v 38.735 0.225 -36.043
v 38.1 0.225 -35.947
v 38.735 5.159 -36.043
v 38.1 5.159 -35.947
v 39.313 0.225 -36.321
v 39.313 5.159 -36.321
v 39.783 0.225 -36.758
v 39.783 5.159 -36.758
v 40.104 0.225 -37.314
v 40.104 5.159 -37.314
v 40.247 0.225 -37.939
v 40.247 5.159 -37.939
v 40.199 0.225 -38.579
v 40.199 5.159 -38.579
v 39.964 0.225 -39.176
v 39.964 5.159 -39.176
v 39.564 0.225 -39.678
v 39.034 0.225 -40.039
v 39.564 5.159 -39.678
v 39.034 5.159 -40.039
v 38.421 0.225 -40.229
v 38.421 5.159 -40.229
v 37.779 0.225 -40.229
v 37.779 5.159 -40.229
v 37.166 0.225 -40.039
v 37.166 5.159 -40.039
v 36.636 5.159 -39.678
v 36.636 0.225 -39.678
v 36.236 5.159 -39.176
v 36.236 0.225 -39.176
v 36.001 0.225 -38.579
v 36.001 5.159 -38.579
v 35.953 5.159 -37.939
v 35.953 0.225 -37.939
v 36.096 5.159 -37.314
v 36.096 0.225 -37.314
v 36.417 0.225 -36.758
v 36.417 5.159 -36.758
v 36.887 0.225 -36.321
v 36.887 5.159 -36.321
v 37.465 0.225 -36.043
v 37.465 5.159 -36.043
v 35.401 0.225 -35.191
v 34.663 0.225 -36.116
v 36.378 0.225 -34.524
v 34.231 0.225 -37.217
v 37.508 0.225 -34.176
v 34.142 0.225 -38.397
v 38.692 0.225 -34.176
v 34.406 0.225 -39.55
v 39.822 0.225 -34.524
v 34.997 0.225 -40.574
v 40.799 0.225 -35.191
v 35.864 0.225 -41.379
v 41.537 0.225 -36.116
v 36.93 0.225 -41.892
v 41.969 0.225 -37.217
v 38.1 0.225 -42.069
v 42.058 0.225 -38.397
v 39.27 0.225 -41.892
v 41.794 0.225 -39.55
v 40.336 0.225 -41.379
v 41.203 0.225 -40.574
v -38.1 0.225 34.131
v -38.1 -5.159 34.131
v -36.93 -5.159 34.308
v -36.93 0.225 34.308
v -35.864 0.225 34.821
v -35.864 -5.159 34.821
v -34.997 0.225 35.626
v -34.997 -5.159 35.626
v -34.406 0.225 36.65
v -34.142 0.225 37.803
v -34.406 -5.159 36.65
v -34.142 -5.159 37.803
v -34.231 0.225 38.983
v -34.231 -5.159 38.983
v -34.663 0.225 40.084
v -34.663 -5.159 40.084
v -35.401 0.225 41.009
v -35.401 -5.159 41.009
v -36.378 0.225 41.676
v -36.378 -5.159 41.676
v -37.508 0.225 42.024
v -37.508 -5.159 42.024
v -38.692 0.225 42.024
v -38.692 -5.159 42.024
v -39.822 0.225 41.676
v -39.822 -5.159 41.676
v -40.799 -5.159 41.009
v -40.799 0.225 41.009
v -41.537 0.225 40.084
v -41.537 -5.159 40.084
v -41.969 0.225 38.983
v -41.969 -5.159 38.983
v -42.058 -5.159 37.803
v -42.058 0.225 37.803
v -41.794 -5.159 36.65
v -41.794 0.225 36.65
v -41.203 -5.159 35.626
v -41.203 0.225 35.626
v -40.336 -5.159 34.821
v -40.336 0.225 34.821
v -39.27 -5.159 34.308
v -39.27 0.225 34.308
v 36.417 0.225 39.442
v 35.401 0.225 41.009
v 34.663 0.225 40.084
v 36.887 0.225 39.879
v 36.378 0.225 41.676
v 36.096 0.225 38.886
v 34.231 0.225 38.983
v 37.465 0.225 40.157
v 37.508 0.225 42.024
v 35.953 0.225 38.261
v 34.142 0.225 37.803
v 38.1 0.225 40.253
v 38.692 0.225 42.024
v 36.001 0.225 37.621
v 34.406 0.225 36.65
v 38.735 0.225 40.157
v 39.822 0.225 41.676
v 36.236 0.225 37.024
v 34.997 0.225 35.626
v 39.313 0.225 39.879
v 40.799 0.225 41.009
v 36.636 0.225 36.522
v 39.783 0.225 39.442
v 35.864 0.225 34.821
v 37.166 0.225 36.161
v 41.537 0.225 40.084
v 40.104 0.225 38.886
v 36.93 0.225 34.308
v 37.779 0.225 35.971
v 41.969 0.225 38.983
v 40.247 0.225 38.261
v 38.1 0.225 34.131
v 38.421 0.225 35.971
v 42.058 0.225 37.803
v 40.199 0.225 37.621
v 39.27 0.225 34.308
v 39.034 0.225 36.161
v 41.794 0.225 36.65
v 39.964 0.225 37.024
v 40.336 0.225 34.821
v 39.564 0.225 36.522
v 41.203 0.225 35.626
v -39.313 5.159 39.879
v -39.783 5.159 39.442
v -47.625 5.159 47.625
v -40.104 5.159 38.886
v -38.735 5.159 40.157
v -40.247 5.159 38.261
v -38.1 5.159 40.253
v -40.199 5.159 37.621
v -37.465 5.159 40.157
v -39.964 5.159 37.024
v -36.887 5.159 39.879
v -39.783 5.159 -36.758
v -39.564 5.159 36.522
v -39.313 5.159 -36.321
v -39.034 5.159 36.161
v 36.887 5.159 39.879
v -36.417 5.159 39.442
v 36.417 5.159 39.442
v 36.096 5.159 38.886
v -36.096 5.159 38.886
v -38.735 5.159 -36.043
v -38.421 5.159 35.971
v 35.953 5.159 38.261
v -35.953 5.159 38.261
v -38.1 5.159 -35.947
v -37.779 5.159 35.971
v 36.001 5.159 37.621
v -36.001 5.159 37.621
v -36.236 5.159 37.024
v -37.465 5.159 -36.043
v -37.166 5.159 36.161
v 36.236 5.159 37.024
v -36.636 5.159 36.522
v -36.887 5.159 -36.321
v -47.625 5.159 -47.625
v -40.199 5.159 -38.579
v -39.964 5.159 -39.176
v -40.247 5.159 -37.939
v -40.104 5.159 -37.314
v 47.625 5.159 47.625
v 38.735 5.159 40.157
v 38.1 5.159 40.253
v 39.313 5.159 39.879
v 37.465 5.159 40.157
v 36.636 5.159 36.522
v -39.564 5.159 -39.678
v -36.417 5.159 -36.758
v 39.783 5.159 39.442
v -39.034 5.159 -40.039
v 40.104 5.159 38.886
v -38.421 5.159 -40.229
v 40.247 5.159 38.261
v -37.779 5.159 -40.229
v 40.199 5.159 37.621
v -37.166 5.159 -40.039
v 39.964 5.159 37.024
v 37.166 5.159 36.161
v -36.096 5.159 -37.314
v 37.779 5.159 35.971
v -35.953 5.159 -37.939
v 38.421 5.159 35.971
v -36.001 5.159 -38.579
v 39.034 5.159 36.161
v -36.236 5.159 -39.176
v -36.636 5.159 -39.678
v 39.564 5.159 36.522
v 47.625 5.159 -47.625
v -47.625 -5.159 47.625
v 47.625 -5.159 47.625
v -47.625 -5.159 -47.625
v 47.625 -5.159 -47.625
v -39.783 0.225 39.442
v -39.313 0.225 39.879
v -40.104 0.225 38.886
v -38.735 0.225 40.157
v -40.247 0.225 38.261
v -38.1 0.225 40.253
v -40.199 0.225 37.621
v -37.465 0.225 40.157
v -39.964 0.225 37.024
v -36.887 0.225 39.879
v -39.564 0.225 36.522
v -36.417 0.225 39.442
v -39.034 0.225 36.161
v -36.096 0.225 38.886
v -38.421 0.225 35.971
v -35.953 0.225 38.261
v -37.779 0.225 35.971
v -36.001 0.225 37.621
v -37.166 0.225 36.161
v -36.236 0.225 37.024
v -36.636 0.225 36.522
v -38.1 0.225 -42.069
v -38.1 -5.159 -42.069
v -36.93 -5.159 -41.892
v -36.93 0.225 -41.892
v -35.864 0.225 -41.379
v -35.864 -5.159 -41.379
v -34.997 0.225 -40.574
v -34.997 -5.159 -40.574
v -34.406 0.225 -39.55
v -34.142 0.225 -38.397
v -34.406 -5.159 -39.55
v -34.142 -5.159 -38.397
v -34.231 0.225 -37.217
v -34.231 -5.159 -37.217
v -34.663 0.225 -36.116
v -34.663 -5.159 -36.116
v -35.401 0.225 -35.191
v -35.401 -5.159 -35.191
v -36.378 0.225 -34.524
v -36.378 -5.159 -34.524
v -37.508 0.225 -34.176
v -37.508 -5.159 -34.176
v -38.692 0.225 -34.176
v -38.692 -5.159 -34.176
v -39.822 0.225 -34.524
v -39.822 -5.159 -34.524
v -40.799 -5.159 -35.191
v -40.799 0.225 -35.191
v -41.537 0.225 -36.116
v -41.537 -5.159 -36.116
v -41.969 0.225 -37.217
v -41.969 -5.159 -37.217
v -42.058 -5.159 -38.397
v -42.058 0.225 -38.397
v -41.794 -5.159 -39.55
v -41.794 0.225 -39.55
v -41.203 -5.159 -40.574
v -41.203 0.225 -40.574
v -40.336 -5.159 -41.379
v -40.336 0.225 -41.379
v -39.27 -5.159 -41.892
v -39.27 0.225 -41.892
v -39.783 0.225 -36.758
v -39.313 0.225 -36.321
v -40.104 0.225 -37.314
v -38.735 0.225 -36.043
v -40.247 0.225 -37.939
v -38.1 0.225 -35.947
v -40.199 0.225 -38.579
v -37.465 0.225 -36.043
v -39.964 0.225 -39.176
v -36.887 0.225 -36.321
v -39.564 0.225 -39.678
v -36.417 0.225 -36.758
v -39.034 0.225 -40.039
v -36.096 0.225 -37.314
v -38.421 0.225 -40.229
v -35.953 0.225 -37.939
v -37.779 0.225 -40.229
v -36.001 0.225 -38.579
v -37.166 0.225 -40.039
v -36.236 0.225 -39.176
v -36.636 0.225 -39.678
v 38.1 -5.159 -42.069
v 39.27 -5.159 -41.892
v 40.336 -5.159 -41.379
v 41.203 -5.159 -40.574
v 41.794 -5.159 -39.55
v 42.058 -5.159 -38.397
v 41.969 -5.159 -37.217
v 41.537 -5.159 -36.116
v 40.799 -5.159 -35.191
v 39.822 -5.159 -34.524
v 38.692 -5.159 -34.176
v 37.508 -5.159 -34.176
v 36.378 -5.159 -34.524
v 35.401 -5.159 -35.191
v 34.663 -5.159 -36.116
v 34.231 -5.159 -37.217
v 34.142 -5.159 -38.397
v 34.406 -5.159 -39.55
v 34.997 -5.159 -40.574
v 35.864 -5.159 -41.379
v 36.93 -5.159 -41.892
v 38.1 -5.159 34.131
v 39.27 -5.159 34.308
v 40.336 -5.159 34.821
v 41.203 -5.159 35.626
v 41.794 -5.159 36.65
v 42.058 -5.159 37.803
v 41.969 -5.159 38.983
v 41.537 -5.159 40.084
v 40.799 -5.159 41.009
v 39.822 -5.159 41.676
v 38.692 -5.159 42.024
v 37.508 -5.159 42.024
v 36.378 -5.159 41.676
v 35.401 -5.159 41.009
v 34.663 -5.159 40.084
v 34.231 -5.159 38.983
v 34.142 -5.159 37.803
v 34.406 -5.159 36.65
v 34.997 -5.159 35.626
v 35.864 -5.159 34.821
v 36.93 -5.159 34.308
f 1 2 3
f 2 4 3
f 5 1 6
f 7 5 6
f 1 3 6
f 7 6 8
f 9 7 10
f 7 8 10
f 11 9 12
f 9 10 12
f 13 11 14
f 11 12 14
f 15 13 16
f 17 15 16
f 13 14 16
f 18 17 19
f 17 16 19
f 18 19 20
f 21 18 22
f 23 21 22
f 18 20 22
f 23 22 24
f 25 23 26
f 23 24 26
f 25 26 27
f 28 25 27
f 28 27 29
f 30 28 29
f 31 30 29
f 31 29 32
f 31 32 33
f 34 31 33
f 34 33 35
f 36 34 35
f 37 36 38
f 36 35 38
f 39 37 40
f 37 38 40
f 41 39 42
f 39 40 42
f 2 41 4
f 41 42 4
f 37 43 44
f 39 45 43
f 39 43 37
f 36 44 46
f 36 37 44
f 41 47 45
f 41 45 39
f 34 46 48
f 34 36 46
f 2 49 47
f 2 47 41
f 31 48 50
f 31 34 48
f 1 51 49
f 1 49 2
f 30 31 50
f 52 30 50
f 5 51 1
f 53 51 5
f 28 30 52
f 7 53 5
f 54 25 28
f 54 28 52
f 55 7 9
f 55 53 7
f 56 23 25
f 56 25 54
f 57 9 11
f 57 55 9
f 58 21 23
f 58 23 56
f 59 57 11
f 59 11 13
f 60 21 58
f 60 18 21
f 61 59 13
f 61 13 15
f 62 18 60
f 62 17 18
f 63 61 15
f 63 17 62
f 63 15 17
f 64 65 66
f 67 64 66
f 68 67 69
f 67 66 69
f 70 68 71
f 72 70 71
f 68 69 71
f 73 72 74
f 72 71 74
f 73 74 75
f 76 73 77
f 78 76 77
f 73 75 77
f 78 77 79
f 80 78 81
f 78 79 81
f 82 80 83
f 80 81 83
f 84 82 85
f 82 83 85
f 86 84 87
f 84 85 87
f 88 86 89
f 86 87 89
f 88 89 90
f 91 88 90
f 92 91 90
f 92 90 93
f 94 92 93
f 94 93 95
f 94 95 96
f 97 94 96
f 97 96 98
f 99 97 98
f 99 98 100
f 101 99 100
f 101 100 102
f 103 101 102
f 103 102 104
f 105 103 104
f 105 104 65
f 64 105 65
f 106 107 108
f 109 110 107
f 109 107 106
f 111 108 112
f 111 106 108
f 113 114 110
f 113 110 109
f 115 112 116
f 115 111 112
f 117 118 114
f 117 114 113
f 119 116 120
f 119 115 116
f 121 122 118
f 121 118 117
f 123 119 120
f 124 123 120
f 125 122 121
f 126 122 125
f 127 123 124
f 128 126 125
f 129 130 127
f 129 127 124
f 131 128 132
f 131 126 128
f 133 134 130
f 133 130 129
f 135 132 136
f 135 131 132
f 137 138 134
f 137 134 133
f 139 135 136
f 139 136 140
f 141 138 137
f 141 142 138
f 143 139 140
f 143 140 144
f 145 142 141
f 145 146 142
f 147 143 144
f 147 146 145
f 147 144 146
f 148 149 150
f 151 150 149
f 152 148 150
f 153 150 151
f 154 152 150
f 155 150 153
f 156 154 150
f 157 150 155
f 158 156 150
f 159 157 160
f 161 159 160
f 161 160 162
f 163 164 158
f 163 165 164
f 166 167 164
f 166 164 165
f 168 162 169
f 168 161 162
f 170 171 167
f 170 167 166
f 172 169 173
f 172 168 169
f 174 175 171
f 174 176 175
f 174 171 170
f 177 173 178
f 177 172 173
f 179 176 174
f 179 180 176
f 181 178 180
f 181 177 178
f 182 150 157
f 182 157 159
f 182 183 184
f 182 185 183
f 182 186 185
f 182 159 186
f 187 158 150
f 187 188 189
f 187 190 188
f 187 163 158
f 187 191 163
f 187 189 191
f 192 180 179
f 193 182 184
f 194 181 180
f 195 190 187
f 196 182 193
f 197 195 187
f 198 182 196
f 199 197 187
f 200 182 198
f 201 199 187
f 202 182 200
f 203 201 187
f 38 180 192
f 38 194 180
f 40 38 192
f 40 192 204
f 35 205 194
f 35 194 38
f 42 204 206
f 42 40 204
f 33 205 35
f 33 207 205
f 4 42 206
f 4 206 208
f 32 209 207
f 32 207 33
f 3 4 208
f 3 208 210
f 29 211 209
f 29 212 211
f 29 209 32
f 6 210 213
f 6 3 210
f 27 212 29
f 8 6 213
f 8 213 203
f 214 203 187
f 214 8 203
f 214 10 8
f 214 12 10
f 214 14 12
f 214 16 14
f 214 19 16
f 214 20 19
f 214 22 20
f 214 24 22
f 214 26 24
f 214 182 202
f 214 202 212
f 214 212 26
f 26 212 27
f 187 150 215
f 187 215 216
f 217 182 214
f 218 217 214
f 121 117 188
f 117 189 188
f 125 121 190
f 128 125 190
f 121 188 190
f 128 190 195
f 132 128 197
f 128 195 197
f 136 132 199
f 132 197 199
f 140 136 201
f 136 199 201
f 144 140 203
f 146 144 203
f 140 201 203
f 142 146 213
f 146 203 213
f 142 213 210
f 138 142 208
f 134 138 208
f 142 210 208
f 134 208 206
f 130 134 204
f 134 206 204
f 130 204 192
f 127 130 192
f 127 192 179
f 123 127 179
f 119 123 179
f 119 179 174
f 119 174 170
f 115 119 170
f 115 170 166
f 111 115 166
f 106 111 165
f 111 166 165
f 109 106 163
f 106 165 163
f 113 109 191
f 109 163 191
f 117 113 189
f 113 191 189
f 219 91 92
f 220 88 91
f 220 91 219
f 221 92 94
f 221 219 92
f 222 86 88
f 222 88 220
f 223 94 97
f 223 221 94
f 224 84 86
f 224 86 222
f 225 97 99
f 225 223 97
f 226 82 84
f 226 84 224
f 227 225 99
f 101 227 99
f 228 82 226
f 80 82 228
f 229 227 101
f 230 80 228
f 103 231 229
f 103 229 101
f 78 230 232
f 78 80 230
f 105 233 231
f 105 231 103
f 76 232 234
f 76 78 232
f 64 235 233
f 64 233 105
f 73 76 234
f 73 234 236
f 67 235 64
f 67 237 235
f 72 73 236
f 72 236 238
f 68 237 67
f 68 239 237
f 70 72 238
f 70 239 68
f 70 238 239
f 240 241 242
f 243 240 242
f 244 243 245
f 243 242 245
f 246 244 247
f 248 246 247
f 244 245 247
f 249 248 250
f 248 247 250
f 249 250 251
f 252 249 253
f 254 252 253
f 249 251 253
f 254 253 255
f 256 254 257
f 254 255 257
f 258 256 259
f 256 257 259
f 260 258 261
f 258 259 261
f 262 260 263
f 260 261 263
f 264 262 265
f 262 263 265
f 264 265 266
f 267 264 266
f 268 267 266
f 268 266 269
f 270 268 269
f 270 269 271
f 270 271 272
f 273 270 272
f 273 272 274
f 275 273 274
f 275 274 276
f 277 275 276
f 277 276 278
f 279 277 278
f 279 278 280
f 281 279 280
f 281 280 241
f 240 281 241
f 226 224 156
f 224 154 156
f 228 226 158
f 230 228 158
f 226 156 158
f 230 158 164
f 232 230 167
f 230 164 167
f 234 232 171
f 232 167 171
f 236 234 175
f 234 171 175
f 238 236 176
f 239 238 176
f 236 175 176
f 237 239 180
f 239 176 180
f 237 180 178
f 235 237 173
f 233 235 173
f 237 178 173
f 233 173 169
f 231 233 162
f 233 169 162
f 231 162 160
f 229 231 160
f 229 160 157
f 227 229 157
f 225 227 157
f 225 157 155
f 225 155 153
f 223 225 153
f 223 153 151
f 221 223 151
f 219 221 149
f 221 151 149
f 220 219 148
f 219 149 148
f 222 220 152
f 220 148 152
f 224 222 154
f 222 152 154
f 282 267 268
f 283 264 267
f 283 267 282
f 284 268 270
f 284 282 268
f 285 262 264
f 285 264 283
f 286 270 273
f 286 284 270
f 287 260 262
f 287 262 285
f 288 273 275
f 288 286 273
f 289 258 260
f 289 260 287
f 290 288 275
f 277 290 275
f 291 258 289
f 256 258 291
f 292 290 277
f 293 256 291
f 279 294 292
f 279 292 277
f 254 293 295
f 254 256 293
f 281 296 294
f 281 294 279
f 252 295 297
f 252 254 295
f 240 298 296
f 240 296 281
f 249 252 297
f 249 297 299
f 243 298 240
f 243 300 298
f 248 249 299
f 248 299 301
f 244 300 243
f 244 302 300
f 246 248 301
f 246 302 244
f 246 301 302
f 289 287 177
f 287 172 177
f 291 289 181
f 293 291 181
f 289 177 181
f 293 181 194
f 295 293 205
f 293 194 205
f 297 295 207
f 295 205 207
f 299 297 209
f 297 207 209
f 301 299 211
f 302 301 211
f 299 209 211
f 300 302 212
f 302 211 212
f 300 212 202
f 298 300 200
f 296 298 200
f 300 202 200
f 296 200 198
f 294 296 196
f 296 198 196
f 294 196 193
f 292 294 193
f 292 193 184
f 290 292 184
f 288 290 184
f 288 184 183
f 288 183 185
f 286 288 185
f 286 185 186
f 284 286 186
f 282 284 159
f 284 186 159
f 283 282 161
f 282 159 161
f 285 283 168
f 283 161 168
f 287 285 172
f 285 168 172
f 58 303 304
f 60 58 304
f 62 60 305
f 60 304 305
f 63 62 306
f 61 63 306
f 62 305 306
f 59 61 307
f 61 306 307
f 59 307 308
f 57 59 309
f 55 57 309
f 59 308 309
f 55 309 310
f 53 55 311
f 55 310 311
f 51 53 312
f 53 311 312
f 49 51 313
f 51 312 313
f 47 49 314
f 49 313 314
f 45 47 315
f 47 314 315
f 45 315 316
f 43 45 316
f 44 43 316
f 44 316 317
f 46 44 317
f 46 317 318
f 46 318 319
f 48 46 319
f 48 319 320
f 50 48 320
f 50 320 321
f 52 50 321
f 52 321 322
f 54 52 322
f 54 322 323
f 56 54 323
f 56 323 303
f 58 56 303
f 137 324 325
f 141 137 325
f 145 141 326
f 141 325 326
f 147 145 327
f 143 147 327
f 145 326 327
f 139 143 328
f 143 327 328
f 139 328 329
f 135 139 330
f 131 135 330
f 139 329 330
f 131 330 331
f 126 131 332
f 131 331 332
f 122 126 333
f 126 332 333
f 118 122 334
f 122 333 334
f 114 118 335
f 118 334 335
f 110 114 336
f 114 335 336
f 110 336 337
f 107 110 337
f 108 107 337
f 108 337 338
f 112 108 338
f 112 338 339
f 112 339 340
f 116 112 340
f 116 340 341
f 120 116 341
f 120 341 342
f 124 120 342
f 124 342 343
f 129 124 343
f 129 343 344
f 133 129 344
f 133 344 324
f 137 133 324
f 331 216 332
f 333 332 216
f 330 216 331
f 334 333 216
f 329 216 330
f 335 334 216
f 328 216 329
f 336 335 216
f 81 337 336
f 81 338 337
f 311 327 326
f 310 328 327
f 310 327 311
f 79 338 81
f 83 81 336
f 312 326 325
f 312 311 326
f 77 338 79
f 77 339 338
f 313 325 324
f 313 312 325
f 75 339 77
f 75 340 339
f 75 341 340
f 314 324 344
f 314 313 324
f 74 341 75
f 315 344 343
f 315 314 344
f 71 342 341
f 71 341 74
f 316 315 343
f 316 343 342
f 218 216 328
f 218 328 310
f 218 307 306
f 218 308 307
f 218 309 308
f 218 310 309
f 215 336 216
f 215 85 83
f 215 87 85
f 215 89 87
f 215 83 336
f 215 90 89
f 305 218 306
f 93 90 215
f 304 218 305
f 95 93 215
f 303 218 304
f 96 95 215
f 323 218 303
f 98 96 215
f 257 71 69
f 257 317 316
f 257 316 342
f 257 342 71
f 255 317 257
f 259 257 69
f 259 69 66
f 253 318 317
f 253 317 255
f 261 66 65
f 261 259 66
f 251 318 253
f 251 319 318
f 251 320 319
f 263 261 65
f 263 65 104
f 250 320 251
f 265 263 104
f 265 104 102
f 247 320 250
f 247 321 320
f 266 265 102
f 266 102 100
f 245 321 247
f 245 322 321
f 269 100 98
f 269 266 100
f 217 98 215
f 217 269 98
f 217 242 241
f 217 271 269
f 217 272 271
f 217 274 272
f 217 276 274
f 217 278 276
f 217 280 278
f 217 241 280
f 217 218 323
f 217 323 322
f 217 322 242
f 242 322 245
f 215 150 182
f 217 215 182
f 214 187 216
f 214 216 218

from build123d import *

# Parameters (mm, degrees)
SKETCH3_W                           = 101.6
SKETCH3_H                           = 11.1125
BOSS_EXTRUDE1_DEPTH                 = 50.8
BASEBORDERRADIUSSKETCH_OUTSIDE_W    = 132.41
BASEBORDERRADIUSSKETCH_OUTSIDE_H    = 132.41
BASEBORDERRADIUSSKETCH_OUTSIDE_W_2  = 95.25
BASEBORDERRADIUSSKETCH_OUTSIDE_H_2  = 95.25
BASEBORDERRADIUSCUT_EXTRUDE_DEPTH   = 73.57931249
BUMPER_6_32_TAPPED_HOLE_D           = 4.3053
BUMPER_6_32_TAPPED_HOLE_CBORE_D     = 7.9375
BUMPER_6_32_TAPPED_HOLE_CBORE_DEPTH = 5.3848
BUMPERTHREADLPATTERN_COUNT          = 2
BUMPERTHREADLPATTERN_PITCH          = 76.2
BUMPERTHREADLPATTERN_COUNT_DIR2     = 2
BUMPERTHREADLPATTERN_PITCH_DIR2     = 76.2


with BuildPart() as part:
    # Sketch3 → Boss-Extrude1 (new, symmetric)
    with BuildSketch(Plane.XY):
        Rectangle(SKETCH3_W, SKETCH3_H)
    extrude(amount=BOSS_EXTRUDE1_DEPTH, both=True)

    # FacingTopSurfaceCut
    split(bisect_by=Plane(origin=(0, 5.159375, 0), x_dir=(1, 0, 0), z_dir=(0, 1, 0)), keep=Keep.BOTTOM)

    # FacingBottomSurfaceCut
    split(bisect_by=Plane(origin=(0, -5.159375, 0), x_dir=(-1, 0, 0), z_dir=(0, -1, 0)), keep=Keep.BOTTOM)

    # BaseBorderRadiusSketch outside → BaseBorderRadiusCut-Extrude (cut, through all)
    with BuildSketch(Plane(origin=(0, 5.159375, 0), x_dir=(1, 0, 0), z_dir=(0, 1, 0))):
        Rectangle(BASEBORDERRADIUSSKETCH_OUTSIDE_W, BASEBORDERRADIUSSKETCH_OUTSIDE_H)
        Rectangle(BASEBORDERRADIUSSKETCH_OUTSIDE_W_2, BASEBORDERRADIUSSKETCH_OUTSIDE_H_2, mode=Mode.SUBTRACT)
    extrude(amount=-BASEBORDERRADIUSCUT_EXTRUDE_DEPTH, mode=Mode.SUBTRACT)

    # Bumper#6-32 Tapped Hole (through all)
    with Locations(Plane(origin=(-38.1, -5.159375, 38.1), x_dir=(0, 0, -1), z_dir=(0, -1, 0))):
        with Locations((0, 0)):
            bumper_6_32_tapped_hole = CounterBoreHole(BUMPER_6_32_TAPPED_HOLE_D / 2, BUMPER_6_32_TAPPED_HOLE_CBORE_D / 2, BUMPER_6_32_TAPPED_HOLE_CBORE_DEPTH)

    # BumperThreadLPattern: Bumper_6-32 Tapped Hole 2 × 2
    with Locations(*[(j * BUMPERTHREADLPATTERN_PITCH_DIR2, 0, -i * BUMPERTHREADLPATTERN_PITCH) for i in range(BUMPERTHREADLPATTERN_COUNT) for j in range(BUMPERTHREADLPATTERN_COUNT_DIR2) if (i, j) != (0, 0)]):
        add(bumper_6_32_tapped_hole, mode=Mode.SUBTRACT)


solid = part.part
